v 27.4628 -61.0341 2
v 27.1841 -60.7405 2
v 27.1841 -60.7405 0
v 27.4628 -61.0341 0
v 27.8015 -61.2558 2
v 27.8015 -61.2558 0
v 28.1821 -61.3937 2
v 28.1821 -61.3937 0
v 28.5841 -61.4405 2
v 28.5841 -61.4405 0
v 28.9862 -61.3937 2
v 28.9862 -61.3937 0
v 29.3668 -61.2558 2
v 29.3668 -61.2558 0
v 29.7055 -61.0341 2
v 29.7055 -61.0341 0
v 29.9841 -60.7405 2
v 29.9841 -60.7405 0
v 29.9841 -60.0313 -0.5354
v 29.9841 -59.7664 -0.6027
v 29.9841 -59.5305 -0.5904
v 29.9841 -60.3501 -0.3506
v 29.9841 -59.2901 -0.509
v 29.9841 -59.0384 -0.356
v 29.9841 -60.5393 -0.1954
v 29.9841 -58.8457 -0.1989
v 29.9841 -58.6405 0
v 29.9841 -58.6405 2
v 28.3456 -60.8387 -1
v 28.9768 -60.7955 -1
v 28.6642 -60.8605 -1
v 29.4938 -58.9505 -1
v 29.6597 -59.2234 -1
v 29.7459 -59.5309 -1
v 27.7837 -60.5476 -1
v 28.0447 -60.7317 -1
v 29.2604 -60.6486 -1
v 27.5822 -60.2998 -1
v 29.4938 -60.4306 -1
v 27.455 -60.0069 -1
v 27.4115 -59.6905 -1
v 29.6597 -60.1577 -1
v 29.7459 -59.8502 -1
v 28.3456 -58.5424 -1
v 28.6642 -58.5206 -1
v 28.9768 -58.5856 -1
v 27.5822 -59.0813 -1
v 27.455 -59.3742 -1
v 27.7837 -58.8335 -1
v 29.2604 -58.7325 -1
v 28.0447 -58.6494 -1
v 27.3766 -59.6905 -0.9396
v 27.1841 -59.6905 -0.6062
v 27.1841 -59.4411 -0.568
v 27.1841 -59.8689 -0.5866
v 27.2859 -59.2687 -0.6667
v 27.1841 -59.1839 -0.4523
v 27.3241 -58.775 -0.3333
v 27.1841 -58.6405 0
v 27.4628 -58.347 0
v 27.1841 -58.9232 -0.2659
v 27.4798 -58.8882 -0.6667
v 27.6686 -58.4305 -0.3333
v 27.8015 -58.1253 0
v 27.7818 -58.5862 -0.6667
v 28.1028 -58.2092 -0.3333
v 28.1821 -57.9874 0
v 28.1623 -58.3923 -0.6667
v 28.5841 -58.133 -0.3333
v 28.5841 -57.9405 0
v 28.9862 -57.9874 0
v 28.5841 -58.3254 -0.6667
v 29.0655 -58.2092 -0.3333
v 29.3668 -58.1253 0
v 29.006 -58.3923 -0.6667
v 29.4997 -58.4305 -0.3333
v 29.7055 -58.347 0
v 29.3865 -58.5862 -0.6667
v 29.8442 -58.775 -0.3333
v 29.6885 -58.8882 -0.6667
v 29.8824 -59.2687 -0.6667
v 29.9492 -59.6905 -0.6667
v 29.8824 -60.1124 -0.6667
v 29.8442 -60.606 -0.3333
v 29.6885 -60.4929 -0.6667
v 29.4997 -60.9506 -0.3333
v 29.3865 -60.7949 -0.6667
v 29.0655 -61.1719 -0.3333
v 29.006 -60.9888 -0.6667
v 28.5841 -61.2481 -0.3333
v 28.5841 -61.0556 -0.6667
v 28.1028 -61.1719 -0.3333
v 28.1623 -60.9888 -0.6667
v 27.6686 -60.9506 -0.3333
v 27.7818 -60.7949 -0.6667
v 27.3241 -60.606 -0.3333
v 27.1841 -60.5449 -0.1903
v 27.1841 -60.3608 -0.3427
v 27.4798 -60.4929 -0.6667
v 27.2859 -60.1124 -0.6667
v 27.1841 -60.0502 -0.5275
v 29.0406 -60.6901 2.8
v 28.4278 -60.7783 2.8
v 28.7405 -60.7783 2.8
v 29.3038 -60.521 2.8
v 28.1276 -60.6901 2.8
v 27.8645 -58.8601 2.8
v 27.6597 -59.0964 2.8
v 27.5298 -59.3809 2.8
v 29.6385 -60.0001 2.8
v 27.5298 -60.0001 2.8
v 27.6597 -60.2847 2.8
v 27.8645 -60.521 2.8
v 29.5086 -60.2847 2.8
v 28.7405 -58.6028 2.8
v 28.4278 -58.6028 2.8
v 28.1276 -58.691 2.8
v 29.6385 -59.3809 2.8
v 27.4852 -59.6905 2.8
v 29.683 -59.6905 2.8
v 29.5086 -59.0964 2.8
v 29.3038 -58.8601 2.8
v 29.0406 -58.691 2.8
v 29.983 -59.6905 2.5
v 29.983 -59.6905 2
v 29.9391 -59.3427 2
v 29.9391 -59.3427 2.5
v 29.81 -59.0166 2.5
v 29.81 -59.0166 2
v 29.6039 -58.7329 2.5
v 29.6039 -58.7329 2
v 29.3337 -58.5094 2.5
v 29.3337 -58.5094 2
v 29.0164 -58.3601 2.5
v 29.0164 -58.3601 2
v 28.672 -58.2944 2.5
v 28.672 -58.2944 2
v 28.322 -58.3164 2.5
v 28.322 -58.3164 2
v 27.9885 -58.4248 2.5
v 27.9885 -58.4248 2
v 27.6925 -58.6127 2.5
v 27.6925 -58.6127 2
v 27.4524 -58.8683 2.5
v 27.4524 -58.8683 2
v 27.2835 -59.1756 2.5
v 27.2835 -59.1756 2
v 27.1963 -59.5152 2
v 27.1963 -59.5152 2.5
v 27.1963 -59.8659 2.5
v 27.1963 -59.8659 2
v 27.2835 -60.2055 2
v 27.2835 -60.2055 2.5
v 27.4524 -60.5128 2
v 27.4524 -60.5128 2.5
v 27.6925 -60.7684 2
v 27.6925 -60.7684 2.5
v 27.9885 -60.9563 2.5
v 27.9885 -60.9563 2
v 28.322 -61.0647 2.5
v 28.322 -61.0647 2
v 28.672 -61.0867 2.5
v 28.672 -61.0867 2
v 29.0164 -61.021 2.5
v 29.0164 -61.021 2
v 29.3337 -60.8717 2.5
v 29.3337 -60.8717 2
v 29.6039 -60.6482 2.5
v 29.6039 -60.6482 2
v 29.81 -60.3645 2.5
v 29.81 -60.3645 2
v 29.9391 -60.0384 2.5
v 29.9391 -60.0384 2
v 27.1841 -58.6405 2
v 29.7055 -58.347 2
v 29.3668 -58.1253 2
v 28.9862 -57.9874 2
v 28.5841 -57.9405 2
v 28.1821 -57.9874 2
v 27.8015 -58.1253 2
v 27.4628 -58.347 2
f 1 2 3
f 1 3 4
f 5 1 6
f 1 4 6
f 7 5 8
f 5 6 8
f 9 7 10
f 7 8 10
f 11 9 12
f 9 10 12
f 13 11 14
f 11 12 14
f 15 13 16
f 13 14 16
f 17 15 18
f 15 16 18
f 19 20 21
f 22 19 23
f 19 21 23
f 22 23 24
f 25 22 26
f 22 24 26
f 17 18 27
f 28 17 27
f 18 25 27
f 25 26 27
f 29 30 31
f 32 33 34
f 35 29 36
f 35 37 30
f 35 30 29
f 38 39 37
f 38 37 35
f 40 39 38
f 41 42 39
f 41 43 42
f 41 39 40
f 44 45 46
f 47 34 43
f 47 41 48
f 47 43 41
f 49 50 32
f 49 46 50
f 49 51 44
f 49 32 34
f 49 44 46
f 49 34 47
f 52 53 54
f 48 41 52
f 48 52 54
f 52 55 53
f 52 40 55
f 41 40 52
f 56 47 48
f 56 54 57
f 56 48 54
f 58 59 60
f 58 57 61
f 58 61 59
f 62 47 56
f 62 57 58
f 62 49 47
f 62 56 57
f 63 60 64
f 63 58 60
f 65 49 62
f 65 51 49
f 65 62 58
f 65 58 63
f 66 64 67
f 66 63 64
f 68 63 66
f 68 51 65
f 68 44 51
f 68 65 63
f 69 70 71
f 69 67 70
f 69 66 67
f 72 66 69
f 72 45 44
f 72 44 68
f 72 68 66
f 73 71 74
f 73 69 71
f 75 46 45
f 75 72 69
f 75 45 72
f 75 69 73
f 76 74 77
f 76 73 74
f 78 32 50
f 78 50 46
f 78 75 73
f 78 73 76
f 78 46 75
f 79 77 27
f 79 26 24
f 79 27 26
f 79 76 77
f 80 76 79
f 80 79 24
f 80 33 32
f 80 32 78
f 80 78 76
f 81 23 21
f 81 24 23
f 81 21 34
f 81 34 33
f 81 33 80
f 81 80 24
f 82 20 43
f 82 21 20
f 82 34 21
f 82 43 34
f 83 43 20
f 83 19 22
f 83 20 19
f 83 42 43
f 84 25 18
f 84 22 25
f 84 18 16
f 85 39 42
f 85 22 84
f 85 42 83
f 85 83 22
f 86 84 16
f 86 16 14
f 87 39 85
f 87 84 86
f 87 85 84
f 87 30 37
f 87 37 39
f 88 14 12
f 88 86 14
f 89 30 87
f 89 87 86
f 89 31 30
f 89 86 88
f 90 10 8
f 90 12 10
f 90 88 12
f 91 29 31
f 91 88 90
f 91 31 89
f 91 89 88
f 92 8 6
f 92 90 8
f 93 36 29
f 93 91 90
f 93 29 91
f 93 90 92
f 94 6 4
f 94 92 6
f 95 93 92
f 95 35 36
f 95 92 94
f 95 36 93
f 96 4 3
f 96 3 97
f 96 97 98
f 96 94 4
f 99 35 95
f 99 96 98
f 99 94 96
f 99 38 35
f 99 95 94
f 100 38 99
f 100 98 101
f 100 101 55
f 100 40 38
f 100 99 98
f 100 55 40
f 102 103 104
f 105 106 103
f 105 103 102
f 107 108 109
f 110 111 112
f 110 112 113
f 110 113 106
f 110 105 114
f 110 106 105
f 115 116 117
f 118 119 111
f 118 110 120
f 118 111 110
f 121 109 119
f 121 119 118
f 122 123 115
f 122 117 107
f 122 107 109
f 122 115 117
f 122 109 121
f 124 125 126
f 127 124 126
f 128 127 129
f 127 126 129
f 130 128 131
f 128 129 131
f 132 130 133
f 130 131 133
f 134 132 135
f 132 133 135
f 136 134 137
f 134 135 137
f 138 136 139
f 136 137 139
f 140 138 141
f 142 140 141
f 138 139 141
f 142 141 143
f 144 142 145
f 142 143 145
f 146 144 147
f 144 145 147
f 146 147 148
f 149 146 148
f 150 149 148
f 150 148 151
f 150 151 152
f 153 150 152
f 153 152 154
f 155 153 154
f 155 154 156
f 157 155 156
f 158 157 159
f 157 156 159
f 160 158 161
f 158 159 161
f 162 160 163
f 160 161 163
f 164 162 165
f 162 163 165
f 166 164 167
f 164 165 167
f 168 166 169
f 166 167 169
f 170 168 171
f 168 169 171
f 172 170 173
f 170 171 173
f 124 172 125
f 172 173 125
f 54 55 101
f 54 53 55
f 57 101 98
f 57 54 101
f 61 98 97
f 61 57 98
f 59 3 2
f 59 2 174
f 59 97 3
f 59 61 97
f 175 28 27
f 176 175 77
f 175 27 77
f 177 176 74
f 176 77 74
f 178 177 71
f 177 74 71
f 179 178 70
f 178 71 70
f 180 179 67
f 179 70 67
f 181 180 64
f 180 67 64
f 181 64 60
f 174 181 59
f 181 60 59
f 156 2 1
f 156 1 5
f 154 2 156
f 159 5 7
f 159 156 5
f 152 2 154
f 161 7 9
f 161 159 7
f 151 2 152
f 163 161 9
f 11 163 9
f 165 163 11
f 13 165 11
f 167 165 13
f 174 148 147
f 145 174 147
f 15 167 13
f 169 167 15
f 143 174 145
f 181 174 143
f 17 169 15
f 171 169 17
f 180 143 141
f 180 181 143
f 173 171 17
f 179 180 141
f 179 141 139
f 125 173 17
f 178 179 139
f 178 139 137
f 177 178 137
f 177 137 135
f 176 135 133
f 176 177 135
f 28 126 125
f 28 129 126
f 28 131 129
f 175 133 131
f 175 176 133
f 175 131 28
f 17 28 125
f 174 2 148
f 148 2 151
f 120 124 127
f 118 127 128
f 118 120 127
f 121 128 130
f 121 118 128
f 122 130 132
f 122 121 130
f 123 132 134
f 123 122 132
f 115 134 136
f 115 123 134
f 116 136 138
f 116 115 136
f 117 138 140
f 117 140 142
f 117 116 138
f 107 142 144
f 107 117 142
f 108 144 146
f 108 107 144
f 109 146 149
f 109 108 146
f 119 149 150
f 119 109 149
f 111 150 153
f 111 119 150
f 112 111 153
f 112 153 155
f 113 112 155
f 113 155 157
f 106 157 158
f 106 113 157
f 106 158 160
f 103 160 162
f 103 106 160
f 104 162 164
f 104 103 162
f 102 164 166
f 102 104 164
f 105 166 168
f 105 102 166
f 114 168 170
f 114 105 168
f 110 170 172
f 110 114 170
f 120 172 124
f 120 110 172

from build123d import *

# Parameters (mm, degrees)
SKETCH_1_R          = 1.75
EXTRUDE_1_DEPTH     = 2
SKETCH_2_R          = 1.39889858
EXTRUDE_2_DEPTH     = 0.8
CHAMFER_1_SIZE      = 0.3
SKETCH_3_R          = 1.75
EXTRUDE_3_DEPTH     = 1
EXTRUDE_3_TAPER     = 30
SKETCH_4_W          = 1.530864342
SKETCH_4_H          = 4.455127657
SKETCH_4_W_2        = 1.518367491
CUT_EXTRUDE_2_DEPTH = 3


with BuildPart() as part:
    # 草图1 → 凸台-拉伸1 (new body)
    with BuildSketch(Plane.XY):
        with Locations((28.584145679, -59.690544666)):
            Circle(SKETCH_1_R)
    extrude(amount=EXTRUDE_1_DEPTH)

    # 草图2 → 凸台-拉伸2 (add)
    with BuildSketch(Plane.XY.offset(2)):
        with Locations((28.584145679, -59.690544666)):
            Circle(SKETCH_2_R)
    extrude(amount=EXTRUDE_2_DEPTH)

    # 倒角1
    chamfer_1_edges = [part.edges().sort_by_distance(p)[0] for p in [
        (27.185247099, -59.690544666, 2.8),
    ]]
    chamfer(chamfer_1_edges, length=CHAMFER_1_SIZE)

    # 草图3 → 凸台-拉伸3 (add)
    with BuildSketch(Plane(origin=(0, 0, 0), x_dir=(-1, 0, 0), z_dir=(0, 0, -1))):
        with Locations((-28.584145679, -59.690544666)):
            Circle(SKETCH_3_R)
    extrude(amount=EXTRUDE_3_DEPTH, taper=EXTRUDE_3_TAPER)

    # 草图4 → 切除-拉伸2 (cut)
    with BuildSketch(Plane(origin=(0, 0, -1), x_dir=(-1, 0, 0), z_dir=(0, 0, -1))):
        with Locations((-26.418713508, -59.807019358)):
            Rectangle(SKETCH_4_W, SKETCH_4_H)
        with Locations((-30.743329425, -59.807019358)):
            Rectangle(SKETCH_4_W_2, SKETCH_4_H)
    extrude(amount=-CUT_EXTRUDE_2_DEPTH, mode=Mode.SUBTRACT)


solid = part.part
